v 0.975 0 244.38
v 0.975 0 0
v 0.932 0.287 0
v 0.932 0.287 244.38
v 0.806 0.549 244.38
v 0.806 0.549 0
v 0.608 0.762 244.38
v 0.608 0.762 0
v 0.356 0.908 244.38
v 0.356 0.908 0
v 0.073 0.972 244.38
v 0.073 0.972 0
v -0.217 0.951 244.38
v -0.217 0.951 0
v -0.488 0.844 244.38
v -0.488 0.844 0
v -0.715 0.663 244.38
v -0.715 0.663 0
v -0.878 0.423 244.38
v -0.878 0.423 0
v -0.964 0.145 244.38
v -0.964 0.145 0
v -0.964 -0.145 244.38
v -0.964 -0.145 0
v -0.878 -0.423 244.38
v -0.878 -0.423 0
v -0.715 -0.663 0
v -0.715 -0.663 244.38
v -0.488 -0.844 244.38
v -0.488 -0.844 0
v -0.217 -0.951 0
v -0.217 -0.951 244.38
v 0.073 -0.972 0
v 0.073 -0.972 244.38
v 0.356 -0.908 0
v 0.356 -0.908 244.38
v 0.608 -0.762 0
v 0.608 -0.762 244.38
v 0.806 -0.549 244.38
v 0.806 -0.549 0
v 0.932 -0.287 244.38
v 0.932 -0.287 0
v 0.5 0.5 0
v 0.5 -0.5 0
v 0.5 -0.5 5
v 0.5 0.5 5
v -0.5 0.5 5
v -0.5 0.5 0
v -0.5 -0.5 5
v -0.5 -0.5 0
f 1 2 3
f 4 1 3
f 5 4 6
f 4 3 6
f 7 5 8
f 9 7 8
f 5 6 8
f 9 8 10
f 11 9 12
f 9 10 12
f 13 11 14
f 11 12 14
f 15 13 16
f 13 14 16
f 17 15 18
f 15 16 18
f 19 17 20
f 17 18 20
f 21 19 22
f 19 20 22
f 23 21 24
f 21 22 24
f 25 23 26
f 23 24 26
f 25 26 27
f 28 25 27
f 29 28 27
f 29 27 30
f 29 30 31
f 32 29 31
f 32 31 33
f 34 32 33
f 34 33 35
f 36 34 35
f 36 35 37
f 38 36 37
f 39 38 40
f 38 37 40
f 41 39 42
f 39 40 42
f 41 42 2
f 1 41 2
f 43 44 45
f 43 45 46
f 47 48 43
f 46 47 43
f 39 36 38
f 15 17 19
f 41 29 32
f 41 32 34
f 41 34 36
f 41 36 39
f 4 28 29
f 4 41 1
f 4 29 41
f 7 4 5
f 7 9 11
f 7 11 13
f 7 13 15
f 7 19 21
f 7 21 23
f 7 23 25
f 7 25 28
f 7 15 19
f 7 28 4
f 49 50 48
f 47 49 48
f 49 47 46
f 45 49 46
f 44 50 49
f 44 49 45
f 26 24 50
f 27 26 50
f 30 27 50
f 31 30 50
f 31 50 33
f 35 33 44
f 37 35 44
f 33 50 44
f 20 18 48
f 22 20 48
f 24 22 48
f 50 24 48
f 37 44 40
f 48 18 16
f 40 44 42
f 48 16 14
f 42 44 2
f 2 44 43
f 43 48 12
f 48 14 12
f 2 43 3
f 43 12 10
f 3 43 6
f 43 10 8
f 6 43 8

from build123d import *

# Parameters (mm, degrees)
SKETCH1_R           = 0.975
BOSS_EXTRUDE1_DEPTH = 244.38
SKETCH2_W           = 1
SKETCH2_H           = 1
CUT_EXTRUDE1_DEPTH  = 5


with BuildPart() as part:
    # Sketch1 → Boss-Extrude1 (new body)
    with BuildSketch(Plane.XY):
        Circle(SKETCH1_R)
    extrude(amount=BOSS_EXTRUDE1_DEPTH)

    # Sketch2 → Cut-Extrude1 (cut)
    with BuildSketch(Plane.XY):
        Rectangle(SKETCH2_W, SKETCH2_H)
    extrude(amount=CUT_EXTRUDE1_DEPTH, mode=Mode.SUBTRACT)


solid = part.part
